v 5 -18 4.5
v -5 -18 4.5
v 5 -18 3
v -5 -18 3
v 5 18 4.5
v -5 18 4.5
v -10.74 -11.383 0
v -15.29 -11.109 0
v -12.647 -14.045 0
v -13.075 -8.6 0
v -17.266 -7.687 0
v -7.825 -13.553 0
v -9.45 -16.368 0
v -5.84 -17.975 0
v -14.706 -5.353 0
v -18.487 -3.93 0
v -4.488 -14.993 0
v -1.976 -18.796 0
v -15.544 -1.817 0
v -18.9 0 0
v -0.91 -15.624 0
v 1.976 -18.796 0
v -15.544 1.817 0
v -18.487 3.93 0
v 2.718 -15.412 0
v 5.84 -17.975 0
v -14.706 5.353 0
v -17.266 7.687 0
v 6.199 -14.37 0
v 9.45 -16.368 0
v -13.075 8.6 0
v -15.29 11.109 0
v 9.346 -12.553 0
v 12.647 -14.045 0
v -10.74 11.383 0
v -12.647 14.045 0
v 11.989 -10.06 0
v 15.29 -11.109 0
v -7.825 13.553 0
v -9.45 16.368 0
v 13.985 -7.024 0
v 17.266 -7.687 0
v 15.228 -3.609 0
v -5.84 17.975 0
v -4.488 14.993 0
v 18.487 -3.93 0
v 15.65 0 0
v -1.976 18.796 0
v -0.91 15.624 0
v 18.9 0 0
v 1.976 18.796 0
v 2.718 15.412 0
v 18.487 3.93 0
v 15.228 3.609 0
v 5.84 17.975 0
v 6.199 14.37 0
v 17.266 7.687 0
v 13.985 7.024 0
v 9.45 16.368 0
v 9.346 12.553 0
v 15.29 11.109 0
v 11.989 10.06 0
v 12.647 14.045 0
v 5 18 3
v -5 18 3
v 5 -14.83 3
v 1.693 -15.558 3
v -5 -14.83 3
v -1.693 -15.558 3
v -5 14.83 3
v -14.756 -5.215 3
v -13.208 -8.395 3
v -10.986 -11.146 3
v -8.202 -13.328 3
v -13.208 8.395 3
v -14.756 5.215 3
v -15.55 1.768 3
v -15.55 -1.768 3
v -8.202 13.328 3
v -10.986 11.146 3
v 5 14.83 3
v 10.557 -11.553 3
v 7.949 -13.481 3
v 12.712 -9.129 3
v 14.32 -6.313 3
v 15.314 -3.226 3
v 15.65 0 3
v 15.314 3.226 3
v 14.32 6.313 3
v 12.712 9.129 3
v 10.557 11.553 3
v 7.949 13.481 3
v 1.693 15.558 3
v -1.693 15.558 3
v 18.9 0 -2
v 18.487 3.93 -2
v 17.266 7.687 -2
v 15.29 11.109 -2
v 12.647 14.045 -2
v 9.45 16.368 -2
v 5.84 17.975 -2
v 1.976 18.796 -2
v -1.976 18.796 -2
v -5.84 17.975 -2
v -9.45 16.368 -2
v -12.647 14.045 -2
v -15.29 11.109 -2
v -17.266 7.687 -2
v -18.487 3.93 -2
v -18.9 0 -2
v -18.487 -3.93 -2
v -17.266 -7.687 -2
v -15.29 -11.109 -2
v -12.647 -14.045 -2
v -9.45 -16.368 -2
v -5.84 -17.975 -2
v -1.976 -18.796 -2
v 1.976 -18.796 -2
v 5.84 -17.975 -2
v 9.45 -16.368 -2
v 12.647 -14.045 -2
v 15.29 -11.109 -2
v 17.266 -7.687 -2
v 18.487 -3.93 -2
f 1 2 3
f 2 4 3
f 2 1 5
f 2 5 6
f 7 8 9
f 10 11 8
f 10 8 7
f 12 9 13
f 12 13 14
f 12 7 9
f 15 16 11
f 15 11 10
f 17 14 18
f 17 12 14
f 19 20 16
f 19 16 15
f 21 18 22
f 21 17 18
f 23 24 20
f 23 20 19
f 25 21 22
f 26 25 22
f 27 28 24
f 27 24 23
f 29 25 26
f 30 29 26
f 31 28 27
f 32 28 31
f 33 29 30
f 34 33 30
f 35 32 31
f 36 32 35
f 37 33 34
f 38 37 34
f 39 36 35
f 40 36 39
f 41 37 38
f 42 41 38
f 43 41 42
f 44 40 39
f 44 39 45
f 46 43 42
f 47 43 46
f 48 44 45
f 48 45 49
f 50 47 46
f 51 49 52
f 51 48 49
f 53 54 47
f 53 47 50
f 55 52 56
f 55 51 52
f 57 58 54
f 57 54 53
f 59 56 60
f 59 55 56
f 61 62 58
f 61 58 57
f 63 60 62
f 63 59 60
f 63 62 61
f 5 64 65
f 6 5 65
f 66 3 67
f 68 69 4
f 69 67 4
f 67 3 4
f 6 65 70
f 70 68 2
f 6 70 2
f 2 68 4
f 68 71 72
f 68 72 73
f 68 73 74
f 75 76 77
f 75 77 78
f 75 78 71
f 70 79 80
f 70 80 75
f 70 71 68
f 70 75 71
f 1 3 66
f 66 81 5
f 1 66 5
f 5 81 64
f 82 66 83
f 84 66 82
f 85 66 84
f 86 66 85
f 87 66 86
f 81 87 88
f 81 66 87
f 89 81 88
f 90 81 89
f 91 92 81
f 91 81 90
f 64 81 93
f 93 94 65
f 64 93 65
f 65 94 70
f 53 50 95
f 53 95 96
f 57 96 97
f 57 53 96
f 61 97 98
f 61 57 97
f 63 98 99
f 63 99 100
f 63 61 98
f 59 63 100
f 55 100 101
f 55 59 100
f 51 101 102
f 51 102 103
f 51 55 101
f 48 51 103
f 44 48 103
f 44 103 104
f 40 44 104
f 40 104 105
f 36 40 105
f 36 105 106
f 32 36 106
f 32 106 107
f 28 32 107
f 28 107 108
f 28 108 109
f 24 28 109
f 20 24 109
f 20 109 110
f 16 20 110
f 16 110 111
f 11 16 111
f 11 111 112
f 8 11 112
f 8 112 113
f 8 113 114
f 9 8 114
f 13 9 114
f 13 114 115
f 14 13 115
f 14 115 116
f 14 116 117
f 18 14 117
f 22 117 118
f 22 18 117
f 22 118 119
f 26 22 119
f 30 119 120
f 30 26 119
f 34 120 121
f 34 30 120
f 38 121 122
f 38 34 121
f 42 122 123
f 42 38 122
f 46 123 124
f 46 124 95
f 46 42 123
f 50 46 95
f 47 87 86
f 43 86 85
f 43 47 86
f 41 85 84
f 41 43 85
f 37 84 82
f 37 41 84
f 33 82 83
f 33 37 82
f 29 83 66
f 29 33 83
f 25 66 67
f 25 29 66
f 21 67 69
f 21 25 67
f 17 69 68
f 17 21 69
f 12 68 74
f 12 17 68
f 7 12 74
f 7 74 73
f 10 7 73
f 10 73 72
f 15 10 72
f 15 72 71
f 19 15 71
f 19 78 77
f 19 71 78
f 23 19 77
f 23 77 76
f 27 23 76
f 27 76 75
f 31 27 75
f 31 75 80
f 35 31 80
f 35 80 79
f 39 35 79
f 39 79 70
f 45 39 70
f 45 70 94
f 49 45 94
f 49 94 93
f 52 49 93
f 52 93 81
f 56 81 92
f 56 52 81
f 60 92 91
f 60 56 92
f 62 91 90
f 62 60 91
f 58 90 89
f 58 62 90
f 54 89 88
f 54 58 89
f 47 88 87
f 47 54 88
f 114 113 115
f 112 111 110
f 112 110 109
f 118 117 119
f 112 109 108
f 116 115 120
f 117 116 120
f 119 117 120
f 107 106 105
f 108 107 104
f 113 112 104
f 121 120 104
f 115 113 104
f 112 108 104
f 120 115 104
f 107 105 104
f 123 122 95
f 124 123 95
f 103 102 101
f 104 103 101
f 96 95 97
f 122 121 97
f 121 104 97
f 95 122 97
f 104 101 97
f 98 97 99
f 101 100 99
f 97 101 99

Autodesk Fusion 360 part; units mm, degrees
sketch "Sketch1" plane through (0, 0, 0) normal (0, 0, 1) x (1, 0, 0)
  circle A0 centre (0, 0) radius 15.65
  circle A1 centre (0, 0) radius 18.9
  dimension "d3" = 31.3
  dimension "d11" = 37.8
extrude "Extrude1" add sketch "Sketch1" along normal blind 3 contours A0
sketch "Sketch2" plane through (0, 0, 3) normal (0, 0, 1) x (-1, 0, 0)
  circle A0 centre (0, 0) radius 15.65
  line L0 (-5, -18) -> (5, -18)
  line L1 (5, -18) -> (5, 18)
  line L2 (5, 18) -> (-5, 18)
  line L3 (-5, 18) -> (-5, -18)
  line L4 (-5, -18) -> (5, 18) construction
  line L5 (5, -18) -> (-5, 18) construction
  dimension "d7" = 10
  dimension "d8" = 36
extrude "Extrude2" add sketch "Sketch2" along normal blind 1.5 contours A0 L1 L3 | A0 L1 L2 L3 | A0 L0 L1 L3
extrude "Extrude3" add sketch "Sketch1" against normal blind 2 contours A0 | A1
equation "bigID = 31.3 mm"
equation "bigtab = 36 mm"
equation "d3 = bigID"
equation "bigtabwidth = 10 mm"
equation "d7 = bigtabwidth"
equation "d8 = bigtab"
equation "d11 = bigID + 6.5 mm"
